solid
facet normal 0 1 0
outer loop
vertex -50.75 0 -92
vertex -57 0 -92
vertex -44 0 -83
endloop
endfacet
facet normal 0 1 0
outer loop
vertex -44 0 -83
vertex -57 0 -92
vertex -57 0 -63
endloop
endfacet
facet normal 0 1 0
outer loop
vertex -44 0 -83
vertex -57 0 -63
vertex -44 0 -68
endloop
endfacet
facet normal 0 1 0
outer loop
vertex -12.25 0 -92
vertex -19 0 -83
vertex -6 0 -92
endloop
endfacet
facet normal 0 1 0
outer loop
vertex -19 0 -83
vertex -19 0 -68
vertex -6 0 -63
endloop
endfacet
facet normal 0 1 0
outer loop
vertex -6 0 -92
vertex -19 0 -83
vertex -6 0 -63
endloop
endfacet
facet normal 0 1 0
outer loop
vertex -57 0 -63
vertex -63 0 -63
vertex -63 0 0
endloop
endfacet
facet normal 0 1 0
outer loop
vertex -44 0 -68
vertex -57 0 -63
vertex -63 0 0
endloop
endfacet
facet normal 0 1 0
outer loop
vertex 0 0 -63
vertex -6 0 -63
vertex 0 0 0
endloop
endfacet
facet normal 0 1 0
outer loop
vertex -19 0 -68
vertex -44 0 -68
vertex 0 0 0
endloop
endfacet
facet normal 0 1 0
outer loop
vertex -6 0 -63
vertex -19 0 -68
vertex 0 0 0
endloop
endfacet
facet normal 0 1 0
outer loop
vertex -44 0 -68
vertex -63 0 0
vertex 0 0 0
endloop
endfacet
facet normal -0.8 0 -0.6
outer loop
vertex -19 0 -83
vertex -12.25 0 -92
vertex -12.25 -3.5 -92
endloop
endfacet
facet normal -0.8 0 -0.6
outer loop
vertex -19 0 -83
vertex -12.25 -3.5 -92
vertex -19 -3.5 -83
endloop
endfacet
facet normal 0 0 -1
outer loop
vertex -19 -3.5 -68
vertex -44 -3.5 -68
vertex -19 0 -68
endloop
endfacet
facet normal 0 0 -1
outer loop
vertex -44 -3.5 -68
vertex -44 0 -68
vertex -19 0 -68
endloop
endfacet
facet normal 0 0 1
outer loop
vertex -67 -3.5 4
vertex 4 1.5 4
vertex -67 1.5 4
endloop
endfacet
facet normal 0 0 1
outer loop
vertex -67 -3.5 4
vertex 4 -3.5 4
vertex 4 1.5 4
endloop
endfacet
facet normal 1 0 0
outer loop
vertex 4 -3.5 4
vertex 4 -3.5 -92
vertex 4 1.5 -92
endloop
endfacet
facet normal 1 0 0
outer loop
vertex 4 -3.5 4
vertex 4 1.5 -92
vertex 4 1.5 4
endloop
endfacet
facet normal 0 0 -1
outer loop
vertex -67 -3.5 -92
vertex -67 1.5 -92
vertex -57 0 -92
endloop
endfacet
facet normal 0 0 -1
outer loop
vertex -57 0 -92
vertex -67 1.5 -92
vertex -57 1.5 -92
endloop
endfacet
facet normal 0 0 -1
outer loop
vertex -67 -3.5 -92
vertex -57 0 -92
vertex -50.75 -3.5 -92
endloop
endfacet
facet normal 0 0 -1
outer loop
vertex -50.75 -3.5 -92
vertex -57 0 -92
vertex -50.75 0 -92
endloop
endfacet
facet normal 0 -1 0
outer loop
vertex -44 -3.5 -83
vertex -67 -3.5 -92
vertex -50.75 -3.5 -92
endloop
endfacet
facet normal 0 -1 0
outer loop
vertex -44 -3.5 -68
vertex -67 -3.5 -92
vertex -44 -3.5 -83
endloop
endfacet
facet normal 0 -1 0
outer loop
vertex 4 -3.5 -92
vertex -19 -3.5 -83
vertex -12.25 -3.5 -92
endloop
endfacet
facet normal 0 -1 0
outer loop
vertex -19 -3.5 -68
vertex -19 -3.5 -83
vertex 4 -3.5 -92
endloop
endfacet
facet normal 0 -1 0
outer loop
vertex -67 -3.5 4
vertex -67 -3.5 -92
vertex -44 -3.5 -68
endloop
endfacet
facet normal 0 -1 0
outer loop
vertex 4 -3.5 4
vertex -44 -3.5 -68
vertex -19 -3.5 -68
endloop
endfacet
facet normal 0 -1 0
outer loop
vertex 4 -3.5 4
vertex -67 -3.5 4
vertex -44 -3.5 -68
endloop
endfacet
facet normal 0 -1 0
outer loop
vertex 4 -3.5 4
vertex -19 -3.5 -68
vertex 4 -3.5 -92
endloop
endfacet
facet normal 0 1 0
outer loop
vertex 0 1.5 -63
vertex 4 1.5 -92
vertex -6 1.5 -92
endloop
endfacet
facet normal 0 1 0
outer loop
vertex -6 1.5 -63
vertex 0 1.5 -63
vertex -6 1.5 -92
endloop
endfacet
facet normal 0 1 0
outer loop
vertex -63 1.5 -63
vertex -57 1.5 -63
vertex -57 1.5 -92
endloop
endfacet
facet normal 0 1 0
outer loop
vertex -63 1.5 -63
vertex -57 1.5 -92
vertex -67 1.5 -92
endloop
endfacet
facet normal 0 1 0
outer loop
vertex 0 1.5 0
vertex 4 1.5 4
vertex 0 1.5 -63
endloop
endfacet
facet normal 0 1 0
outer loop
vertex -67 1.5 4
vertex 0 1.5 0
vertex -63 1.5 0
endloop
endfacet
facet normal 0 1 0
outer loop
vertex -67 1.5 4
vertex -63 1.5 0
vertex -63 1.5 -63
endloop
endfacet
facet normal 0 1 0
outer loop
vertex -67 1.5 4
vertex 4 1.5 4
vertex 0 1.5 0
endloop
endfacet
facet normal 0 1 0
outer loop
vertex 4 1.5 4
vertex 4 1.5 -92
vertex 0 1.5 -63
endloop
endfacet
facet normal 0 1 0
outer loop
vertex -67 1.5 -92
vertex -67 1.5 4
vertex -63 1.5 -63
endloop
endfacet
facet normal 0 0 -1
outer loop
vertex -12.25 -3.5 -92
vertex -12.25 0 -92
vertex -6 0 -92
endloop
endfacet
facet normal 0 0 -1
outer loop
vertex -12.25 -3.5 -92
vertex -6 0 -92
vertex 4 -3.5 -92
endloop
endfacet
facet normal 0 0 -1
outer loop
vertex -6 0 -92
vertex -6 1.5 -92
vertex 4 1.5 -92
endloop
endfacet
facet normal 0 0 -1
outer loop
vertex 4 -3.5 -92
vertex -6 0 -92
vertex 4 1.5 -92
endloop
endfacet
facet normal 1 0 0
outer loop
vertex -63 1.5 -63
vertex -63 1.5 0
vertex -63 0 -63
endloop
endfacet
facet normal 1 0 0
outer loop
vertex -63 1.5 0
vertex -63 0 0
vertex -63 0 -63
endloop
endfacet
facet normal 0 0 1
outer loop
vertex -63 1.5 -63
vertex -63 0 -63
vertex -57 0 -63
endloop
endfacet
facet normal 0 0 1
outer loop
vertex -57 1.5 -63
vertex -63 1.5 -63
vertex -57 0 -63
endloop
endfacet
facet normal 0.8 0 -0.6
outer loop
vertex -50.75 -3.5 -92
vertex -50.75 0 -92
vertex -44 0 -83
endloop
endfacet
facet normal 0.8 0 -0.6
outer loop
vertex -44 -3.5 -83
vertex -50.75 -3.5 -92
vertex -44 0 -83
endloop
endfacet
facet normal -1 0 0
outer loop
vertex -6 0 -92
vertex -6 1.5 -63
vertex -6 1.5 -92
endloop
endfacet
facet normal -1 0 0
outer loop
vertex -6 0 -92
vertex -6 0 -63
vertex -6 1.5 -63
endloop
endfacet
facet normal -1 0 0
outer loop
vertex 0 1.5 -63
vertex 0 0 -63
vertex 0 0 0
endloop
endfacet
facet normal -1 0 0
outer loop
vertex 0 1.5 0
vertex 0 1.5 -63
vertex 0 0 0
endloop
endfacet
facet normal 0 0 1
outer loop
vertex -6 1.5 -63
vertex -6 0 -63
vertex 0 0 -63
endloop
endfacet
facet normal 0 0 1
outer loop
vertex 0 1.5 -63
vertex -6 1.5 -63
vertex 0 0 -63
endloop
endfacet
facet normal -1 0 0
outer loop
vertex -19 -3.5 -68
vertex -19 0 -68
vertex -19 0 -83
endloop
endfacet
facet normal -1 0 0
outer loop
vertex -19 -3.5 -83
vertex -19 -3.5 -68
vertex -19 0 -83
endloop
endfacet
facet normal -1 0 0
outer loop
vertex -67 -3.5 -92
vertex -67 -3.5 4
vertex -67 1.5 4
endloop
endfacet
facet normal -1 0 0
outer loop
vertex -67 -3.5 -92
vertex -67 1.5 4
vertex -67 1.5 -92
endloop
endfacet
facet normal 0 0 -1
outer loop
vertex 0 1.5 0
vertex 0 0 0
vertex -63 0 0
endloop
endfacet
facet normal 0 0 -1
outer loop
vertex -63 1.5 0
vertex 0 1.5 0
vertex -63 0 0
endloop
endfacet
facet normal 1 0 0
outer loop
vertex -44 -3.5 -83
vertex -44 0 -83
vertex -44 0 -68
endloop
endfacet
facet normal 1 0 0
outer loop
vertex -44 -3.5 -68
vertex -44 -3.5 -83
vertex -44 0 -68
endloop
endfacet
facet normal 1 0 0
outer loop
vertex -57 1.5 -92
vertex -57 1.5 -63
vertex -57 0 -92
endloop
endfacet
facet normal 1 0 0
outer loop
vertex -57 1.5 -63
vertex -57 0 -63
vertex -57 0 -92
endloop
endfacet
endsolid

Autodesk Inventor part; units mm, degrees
ref_plane "YZ Plane" through (0, 0, 0) normal (1, 0, 0) x (0, 1, 0)
ref_plane "XZ Plane" through (0, 0, 0) normal (0, 1, 0) x (-1, 0, 0)
ref_plane "XY Plane" through (0, 0, 0) normal (0, 0, 1) x (1, 0, 0)
sketch "Skizze1" plane through (0, 0, 0) normal (0, 1, 0) x (-1, 0, 0)
  line L0 (0, 0) -> (63, 0)
  line L1 (63, 0) -> (63, -63)
  line L2 (63, -63) -> (0, -63)
  line L3 (0, -63) -> (0, 0)
  line L4 (-4, 4) -> (67, 4)
  line L5 (67, 4) -> (67, -92)
  line L6 (67, -92) -> (-4, -92)
  line L7 (-4, -92) -> (-4, 4)
  line L8 (57, -63) -> (6, -63)
  line L9 (6, -63) -> (6, -68)
  line L10 (6, -68) -> (57, -68)
  line L11 (57, -68) -> (57, -63)
  line L12 (44, -68) -> (19, -68)
  line L13 (19, -68) -> (19, -92)
  line L14 (19, -92) -> (44, -92)
  line L15 (44, -92) -> (44, -68)
  line L16 (44, -68) -> (44, -83)
  line L17 (44, -83) -> (44, -93)
  line L18 (44, -93) -> (49.7342, -93)
  line L19 (49.7342, -93) -> (44, -83)
  line L20 (49.1608, -92) -> (44, -92)
  line L21 (19, -83) -> (19, -93)
  line L22 (19, -93) -> (11.5, -93)
  line L23 (11.5, -93) -> (19, -83)
  line L24 (12.25, -92) -> (19, -92)
  line L25 (57, -68) -> (57, -71.1865)
  line L26 (57, -71.1865) -> (57, -92)
  line L27 (6, -68) -> (6, -92)
  point P0 (19, -80)
  dimension "d0" = 63
  dimension "d1" = 63
  dimension "d2" = 71
  dimension "d3" = 96
  dimension "d4" = 51
  dimension "d5" = 5
  dimension "d6" = 6
  dimension "d7" = 6
  dimension "d8" = 4
  dimension "d9" = 25
  dimension "d10" = 24
  dimension "d11" = 15
  dimension "d14" = 10
  dimension "d15" = 10
  dimension "d16" = 15
  dimension "d23" = 13
  dimension "d24" = 13
extrude "Extrusion1" add sketch "Skizze1" along normal blind 1.5 contours L3 L2 L9 L27 L6 L7 L4 L5 L26 L25 L11 L1 L0
sketch "Skizze2" plane through (0, 0, 0) normal (0, -1, 0) x (1, 0, 0)
  line L0 (4, 4) -> (4, -92) projected
  line L1 (-57, -92) -> (-67, -92) projected
  line L2 (4, 4) -> (-67, 4)
  line L3 (-67, 4) -> (-67, -92)
  line L4 (-67, -92) -> (4, -92)
  line L5 (4, -92) -> (4, 4)
  line L6 (-19, -92) -> (-44, -92)
  line L7 (-44, -92) -> (-44, -68)
  line L8 (-44, -68) -> (-19, -68)
  line L9 (-19, -68) -> (-19, -92)
  line L10 (-6, -92) -> (-6, -63) projected
  line L11 (-57, -63) -> (-57, -92) projected
  line L12 (-44, -68) -> (-44, -83)
  line L13 (-44, -83) -> (-44, -92)
  line L14 (-44, -83) -> (-44, -93)
  line L15 (-44, -83) -> (-34, -83) construction
  line L16 (-44, -93) -> (-51.5, -93)
  line L17 (-51.5, -93) -> (-44, -83)
  line L18 (-19, -83) -> (-19, -93)
  line L19 (-19, -93) -> (-11.5, -93)
  line L20 (-11.5, -93) -> (-19, -83)
  point P0 (0, 0)
  point P1 (-50.75, -92)
  point P2 (-12.25, -92)
  dimension "d19" = 25
  dimension "d20" = 24
  dimension "d21" = 13
  dimension "d22" = 13
  dimension "d25" = 15
  dimension "d26" = 10
  dimension "d27" = 90
  dimension "d28" = 7.5
  dimension "d29" = 7.5
extrude "Extrusion2" add sketch "Skizze2" along normal blind 3.5 contours L0 L4 L20 L9 L8 L7 L17 L1 L3 L2
equation "\"d15\" = d14"
equation "\"Biegeradius\" = Stärke"
equation "\"BreiteBiegungsfreistellung\" = Stärke"
equation "\"TiefeBiegungsfreistellung\" = 0.5 * Stärke"
equation "\"GrößeEckenfreistellung\" = 4 * Stärke"
equation "\"MinimalRest\" = 2 * Stärke"
equation "\"Übergangsradius\" = Biegeradius"
equation "\"JacobiRadiusGröße\" = Biegeradius"
equation "\"Abstandsgröße\" = Stärke"
equation "\"Stärke\" = 0.5"
